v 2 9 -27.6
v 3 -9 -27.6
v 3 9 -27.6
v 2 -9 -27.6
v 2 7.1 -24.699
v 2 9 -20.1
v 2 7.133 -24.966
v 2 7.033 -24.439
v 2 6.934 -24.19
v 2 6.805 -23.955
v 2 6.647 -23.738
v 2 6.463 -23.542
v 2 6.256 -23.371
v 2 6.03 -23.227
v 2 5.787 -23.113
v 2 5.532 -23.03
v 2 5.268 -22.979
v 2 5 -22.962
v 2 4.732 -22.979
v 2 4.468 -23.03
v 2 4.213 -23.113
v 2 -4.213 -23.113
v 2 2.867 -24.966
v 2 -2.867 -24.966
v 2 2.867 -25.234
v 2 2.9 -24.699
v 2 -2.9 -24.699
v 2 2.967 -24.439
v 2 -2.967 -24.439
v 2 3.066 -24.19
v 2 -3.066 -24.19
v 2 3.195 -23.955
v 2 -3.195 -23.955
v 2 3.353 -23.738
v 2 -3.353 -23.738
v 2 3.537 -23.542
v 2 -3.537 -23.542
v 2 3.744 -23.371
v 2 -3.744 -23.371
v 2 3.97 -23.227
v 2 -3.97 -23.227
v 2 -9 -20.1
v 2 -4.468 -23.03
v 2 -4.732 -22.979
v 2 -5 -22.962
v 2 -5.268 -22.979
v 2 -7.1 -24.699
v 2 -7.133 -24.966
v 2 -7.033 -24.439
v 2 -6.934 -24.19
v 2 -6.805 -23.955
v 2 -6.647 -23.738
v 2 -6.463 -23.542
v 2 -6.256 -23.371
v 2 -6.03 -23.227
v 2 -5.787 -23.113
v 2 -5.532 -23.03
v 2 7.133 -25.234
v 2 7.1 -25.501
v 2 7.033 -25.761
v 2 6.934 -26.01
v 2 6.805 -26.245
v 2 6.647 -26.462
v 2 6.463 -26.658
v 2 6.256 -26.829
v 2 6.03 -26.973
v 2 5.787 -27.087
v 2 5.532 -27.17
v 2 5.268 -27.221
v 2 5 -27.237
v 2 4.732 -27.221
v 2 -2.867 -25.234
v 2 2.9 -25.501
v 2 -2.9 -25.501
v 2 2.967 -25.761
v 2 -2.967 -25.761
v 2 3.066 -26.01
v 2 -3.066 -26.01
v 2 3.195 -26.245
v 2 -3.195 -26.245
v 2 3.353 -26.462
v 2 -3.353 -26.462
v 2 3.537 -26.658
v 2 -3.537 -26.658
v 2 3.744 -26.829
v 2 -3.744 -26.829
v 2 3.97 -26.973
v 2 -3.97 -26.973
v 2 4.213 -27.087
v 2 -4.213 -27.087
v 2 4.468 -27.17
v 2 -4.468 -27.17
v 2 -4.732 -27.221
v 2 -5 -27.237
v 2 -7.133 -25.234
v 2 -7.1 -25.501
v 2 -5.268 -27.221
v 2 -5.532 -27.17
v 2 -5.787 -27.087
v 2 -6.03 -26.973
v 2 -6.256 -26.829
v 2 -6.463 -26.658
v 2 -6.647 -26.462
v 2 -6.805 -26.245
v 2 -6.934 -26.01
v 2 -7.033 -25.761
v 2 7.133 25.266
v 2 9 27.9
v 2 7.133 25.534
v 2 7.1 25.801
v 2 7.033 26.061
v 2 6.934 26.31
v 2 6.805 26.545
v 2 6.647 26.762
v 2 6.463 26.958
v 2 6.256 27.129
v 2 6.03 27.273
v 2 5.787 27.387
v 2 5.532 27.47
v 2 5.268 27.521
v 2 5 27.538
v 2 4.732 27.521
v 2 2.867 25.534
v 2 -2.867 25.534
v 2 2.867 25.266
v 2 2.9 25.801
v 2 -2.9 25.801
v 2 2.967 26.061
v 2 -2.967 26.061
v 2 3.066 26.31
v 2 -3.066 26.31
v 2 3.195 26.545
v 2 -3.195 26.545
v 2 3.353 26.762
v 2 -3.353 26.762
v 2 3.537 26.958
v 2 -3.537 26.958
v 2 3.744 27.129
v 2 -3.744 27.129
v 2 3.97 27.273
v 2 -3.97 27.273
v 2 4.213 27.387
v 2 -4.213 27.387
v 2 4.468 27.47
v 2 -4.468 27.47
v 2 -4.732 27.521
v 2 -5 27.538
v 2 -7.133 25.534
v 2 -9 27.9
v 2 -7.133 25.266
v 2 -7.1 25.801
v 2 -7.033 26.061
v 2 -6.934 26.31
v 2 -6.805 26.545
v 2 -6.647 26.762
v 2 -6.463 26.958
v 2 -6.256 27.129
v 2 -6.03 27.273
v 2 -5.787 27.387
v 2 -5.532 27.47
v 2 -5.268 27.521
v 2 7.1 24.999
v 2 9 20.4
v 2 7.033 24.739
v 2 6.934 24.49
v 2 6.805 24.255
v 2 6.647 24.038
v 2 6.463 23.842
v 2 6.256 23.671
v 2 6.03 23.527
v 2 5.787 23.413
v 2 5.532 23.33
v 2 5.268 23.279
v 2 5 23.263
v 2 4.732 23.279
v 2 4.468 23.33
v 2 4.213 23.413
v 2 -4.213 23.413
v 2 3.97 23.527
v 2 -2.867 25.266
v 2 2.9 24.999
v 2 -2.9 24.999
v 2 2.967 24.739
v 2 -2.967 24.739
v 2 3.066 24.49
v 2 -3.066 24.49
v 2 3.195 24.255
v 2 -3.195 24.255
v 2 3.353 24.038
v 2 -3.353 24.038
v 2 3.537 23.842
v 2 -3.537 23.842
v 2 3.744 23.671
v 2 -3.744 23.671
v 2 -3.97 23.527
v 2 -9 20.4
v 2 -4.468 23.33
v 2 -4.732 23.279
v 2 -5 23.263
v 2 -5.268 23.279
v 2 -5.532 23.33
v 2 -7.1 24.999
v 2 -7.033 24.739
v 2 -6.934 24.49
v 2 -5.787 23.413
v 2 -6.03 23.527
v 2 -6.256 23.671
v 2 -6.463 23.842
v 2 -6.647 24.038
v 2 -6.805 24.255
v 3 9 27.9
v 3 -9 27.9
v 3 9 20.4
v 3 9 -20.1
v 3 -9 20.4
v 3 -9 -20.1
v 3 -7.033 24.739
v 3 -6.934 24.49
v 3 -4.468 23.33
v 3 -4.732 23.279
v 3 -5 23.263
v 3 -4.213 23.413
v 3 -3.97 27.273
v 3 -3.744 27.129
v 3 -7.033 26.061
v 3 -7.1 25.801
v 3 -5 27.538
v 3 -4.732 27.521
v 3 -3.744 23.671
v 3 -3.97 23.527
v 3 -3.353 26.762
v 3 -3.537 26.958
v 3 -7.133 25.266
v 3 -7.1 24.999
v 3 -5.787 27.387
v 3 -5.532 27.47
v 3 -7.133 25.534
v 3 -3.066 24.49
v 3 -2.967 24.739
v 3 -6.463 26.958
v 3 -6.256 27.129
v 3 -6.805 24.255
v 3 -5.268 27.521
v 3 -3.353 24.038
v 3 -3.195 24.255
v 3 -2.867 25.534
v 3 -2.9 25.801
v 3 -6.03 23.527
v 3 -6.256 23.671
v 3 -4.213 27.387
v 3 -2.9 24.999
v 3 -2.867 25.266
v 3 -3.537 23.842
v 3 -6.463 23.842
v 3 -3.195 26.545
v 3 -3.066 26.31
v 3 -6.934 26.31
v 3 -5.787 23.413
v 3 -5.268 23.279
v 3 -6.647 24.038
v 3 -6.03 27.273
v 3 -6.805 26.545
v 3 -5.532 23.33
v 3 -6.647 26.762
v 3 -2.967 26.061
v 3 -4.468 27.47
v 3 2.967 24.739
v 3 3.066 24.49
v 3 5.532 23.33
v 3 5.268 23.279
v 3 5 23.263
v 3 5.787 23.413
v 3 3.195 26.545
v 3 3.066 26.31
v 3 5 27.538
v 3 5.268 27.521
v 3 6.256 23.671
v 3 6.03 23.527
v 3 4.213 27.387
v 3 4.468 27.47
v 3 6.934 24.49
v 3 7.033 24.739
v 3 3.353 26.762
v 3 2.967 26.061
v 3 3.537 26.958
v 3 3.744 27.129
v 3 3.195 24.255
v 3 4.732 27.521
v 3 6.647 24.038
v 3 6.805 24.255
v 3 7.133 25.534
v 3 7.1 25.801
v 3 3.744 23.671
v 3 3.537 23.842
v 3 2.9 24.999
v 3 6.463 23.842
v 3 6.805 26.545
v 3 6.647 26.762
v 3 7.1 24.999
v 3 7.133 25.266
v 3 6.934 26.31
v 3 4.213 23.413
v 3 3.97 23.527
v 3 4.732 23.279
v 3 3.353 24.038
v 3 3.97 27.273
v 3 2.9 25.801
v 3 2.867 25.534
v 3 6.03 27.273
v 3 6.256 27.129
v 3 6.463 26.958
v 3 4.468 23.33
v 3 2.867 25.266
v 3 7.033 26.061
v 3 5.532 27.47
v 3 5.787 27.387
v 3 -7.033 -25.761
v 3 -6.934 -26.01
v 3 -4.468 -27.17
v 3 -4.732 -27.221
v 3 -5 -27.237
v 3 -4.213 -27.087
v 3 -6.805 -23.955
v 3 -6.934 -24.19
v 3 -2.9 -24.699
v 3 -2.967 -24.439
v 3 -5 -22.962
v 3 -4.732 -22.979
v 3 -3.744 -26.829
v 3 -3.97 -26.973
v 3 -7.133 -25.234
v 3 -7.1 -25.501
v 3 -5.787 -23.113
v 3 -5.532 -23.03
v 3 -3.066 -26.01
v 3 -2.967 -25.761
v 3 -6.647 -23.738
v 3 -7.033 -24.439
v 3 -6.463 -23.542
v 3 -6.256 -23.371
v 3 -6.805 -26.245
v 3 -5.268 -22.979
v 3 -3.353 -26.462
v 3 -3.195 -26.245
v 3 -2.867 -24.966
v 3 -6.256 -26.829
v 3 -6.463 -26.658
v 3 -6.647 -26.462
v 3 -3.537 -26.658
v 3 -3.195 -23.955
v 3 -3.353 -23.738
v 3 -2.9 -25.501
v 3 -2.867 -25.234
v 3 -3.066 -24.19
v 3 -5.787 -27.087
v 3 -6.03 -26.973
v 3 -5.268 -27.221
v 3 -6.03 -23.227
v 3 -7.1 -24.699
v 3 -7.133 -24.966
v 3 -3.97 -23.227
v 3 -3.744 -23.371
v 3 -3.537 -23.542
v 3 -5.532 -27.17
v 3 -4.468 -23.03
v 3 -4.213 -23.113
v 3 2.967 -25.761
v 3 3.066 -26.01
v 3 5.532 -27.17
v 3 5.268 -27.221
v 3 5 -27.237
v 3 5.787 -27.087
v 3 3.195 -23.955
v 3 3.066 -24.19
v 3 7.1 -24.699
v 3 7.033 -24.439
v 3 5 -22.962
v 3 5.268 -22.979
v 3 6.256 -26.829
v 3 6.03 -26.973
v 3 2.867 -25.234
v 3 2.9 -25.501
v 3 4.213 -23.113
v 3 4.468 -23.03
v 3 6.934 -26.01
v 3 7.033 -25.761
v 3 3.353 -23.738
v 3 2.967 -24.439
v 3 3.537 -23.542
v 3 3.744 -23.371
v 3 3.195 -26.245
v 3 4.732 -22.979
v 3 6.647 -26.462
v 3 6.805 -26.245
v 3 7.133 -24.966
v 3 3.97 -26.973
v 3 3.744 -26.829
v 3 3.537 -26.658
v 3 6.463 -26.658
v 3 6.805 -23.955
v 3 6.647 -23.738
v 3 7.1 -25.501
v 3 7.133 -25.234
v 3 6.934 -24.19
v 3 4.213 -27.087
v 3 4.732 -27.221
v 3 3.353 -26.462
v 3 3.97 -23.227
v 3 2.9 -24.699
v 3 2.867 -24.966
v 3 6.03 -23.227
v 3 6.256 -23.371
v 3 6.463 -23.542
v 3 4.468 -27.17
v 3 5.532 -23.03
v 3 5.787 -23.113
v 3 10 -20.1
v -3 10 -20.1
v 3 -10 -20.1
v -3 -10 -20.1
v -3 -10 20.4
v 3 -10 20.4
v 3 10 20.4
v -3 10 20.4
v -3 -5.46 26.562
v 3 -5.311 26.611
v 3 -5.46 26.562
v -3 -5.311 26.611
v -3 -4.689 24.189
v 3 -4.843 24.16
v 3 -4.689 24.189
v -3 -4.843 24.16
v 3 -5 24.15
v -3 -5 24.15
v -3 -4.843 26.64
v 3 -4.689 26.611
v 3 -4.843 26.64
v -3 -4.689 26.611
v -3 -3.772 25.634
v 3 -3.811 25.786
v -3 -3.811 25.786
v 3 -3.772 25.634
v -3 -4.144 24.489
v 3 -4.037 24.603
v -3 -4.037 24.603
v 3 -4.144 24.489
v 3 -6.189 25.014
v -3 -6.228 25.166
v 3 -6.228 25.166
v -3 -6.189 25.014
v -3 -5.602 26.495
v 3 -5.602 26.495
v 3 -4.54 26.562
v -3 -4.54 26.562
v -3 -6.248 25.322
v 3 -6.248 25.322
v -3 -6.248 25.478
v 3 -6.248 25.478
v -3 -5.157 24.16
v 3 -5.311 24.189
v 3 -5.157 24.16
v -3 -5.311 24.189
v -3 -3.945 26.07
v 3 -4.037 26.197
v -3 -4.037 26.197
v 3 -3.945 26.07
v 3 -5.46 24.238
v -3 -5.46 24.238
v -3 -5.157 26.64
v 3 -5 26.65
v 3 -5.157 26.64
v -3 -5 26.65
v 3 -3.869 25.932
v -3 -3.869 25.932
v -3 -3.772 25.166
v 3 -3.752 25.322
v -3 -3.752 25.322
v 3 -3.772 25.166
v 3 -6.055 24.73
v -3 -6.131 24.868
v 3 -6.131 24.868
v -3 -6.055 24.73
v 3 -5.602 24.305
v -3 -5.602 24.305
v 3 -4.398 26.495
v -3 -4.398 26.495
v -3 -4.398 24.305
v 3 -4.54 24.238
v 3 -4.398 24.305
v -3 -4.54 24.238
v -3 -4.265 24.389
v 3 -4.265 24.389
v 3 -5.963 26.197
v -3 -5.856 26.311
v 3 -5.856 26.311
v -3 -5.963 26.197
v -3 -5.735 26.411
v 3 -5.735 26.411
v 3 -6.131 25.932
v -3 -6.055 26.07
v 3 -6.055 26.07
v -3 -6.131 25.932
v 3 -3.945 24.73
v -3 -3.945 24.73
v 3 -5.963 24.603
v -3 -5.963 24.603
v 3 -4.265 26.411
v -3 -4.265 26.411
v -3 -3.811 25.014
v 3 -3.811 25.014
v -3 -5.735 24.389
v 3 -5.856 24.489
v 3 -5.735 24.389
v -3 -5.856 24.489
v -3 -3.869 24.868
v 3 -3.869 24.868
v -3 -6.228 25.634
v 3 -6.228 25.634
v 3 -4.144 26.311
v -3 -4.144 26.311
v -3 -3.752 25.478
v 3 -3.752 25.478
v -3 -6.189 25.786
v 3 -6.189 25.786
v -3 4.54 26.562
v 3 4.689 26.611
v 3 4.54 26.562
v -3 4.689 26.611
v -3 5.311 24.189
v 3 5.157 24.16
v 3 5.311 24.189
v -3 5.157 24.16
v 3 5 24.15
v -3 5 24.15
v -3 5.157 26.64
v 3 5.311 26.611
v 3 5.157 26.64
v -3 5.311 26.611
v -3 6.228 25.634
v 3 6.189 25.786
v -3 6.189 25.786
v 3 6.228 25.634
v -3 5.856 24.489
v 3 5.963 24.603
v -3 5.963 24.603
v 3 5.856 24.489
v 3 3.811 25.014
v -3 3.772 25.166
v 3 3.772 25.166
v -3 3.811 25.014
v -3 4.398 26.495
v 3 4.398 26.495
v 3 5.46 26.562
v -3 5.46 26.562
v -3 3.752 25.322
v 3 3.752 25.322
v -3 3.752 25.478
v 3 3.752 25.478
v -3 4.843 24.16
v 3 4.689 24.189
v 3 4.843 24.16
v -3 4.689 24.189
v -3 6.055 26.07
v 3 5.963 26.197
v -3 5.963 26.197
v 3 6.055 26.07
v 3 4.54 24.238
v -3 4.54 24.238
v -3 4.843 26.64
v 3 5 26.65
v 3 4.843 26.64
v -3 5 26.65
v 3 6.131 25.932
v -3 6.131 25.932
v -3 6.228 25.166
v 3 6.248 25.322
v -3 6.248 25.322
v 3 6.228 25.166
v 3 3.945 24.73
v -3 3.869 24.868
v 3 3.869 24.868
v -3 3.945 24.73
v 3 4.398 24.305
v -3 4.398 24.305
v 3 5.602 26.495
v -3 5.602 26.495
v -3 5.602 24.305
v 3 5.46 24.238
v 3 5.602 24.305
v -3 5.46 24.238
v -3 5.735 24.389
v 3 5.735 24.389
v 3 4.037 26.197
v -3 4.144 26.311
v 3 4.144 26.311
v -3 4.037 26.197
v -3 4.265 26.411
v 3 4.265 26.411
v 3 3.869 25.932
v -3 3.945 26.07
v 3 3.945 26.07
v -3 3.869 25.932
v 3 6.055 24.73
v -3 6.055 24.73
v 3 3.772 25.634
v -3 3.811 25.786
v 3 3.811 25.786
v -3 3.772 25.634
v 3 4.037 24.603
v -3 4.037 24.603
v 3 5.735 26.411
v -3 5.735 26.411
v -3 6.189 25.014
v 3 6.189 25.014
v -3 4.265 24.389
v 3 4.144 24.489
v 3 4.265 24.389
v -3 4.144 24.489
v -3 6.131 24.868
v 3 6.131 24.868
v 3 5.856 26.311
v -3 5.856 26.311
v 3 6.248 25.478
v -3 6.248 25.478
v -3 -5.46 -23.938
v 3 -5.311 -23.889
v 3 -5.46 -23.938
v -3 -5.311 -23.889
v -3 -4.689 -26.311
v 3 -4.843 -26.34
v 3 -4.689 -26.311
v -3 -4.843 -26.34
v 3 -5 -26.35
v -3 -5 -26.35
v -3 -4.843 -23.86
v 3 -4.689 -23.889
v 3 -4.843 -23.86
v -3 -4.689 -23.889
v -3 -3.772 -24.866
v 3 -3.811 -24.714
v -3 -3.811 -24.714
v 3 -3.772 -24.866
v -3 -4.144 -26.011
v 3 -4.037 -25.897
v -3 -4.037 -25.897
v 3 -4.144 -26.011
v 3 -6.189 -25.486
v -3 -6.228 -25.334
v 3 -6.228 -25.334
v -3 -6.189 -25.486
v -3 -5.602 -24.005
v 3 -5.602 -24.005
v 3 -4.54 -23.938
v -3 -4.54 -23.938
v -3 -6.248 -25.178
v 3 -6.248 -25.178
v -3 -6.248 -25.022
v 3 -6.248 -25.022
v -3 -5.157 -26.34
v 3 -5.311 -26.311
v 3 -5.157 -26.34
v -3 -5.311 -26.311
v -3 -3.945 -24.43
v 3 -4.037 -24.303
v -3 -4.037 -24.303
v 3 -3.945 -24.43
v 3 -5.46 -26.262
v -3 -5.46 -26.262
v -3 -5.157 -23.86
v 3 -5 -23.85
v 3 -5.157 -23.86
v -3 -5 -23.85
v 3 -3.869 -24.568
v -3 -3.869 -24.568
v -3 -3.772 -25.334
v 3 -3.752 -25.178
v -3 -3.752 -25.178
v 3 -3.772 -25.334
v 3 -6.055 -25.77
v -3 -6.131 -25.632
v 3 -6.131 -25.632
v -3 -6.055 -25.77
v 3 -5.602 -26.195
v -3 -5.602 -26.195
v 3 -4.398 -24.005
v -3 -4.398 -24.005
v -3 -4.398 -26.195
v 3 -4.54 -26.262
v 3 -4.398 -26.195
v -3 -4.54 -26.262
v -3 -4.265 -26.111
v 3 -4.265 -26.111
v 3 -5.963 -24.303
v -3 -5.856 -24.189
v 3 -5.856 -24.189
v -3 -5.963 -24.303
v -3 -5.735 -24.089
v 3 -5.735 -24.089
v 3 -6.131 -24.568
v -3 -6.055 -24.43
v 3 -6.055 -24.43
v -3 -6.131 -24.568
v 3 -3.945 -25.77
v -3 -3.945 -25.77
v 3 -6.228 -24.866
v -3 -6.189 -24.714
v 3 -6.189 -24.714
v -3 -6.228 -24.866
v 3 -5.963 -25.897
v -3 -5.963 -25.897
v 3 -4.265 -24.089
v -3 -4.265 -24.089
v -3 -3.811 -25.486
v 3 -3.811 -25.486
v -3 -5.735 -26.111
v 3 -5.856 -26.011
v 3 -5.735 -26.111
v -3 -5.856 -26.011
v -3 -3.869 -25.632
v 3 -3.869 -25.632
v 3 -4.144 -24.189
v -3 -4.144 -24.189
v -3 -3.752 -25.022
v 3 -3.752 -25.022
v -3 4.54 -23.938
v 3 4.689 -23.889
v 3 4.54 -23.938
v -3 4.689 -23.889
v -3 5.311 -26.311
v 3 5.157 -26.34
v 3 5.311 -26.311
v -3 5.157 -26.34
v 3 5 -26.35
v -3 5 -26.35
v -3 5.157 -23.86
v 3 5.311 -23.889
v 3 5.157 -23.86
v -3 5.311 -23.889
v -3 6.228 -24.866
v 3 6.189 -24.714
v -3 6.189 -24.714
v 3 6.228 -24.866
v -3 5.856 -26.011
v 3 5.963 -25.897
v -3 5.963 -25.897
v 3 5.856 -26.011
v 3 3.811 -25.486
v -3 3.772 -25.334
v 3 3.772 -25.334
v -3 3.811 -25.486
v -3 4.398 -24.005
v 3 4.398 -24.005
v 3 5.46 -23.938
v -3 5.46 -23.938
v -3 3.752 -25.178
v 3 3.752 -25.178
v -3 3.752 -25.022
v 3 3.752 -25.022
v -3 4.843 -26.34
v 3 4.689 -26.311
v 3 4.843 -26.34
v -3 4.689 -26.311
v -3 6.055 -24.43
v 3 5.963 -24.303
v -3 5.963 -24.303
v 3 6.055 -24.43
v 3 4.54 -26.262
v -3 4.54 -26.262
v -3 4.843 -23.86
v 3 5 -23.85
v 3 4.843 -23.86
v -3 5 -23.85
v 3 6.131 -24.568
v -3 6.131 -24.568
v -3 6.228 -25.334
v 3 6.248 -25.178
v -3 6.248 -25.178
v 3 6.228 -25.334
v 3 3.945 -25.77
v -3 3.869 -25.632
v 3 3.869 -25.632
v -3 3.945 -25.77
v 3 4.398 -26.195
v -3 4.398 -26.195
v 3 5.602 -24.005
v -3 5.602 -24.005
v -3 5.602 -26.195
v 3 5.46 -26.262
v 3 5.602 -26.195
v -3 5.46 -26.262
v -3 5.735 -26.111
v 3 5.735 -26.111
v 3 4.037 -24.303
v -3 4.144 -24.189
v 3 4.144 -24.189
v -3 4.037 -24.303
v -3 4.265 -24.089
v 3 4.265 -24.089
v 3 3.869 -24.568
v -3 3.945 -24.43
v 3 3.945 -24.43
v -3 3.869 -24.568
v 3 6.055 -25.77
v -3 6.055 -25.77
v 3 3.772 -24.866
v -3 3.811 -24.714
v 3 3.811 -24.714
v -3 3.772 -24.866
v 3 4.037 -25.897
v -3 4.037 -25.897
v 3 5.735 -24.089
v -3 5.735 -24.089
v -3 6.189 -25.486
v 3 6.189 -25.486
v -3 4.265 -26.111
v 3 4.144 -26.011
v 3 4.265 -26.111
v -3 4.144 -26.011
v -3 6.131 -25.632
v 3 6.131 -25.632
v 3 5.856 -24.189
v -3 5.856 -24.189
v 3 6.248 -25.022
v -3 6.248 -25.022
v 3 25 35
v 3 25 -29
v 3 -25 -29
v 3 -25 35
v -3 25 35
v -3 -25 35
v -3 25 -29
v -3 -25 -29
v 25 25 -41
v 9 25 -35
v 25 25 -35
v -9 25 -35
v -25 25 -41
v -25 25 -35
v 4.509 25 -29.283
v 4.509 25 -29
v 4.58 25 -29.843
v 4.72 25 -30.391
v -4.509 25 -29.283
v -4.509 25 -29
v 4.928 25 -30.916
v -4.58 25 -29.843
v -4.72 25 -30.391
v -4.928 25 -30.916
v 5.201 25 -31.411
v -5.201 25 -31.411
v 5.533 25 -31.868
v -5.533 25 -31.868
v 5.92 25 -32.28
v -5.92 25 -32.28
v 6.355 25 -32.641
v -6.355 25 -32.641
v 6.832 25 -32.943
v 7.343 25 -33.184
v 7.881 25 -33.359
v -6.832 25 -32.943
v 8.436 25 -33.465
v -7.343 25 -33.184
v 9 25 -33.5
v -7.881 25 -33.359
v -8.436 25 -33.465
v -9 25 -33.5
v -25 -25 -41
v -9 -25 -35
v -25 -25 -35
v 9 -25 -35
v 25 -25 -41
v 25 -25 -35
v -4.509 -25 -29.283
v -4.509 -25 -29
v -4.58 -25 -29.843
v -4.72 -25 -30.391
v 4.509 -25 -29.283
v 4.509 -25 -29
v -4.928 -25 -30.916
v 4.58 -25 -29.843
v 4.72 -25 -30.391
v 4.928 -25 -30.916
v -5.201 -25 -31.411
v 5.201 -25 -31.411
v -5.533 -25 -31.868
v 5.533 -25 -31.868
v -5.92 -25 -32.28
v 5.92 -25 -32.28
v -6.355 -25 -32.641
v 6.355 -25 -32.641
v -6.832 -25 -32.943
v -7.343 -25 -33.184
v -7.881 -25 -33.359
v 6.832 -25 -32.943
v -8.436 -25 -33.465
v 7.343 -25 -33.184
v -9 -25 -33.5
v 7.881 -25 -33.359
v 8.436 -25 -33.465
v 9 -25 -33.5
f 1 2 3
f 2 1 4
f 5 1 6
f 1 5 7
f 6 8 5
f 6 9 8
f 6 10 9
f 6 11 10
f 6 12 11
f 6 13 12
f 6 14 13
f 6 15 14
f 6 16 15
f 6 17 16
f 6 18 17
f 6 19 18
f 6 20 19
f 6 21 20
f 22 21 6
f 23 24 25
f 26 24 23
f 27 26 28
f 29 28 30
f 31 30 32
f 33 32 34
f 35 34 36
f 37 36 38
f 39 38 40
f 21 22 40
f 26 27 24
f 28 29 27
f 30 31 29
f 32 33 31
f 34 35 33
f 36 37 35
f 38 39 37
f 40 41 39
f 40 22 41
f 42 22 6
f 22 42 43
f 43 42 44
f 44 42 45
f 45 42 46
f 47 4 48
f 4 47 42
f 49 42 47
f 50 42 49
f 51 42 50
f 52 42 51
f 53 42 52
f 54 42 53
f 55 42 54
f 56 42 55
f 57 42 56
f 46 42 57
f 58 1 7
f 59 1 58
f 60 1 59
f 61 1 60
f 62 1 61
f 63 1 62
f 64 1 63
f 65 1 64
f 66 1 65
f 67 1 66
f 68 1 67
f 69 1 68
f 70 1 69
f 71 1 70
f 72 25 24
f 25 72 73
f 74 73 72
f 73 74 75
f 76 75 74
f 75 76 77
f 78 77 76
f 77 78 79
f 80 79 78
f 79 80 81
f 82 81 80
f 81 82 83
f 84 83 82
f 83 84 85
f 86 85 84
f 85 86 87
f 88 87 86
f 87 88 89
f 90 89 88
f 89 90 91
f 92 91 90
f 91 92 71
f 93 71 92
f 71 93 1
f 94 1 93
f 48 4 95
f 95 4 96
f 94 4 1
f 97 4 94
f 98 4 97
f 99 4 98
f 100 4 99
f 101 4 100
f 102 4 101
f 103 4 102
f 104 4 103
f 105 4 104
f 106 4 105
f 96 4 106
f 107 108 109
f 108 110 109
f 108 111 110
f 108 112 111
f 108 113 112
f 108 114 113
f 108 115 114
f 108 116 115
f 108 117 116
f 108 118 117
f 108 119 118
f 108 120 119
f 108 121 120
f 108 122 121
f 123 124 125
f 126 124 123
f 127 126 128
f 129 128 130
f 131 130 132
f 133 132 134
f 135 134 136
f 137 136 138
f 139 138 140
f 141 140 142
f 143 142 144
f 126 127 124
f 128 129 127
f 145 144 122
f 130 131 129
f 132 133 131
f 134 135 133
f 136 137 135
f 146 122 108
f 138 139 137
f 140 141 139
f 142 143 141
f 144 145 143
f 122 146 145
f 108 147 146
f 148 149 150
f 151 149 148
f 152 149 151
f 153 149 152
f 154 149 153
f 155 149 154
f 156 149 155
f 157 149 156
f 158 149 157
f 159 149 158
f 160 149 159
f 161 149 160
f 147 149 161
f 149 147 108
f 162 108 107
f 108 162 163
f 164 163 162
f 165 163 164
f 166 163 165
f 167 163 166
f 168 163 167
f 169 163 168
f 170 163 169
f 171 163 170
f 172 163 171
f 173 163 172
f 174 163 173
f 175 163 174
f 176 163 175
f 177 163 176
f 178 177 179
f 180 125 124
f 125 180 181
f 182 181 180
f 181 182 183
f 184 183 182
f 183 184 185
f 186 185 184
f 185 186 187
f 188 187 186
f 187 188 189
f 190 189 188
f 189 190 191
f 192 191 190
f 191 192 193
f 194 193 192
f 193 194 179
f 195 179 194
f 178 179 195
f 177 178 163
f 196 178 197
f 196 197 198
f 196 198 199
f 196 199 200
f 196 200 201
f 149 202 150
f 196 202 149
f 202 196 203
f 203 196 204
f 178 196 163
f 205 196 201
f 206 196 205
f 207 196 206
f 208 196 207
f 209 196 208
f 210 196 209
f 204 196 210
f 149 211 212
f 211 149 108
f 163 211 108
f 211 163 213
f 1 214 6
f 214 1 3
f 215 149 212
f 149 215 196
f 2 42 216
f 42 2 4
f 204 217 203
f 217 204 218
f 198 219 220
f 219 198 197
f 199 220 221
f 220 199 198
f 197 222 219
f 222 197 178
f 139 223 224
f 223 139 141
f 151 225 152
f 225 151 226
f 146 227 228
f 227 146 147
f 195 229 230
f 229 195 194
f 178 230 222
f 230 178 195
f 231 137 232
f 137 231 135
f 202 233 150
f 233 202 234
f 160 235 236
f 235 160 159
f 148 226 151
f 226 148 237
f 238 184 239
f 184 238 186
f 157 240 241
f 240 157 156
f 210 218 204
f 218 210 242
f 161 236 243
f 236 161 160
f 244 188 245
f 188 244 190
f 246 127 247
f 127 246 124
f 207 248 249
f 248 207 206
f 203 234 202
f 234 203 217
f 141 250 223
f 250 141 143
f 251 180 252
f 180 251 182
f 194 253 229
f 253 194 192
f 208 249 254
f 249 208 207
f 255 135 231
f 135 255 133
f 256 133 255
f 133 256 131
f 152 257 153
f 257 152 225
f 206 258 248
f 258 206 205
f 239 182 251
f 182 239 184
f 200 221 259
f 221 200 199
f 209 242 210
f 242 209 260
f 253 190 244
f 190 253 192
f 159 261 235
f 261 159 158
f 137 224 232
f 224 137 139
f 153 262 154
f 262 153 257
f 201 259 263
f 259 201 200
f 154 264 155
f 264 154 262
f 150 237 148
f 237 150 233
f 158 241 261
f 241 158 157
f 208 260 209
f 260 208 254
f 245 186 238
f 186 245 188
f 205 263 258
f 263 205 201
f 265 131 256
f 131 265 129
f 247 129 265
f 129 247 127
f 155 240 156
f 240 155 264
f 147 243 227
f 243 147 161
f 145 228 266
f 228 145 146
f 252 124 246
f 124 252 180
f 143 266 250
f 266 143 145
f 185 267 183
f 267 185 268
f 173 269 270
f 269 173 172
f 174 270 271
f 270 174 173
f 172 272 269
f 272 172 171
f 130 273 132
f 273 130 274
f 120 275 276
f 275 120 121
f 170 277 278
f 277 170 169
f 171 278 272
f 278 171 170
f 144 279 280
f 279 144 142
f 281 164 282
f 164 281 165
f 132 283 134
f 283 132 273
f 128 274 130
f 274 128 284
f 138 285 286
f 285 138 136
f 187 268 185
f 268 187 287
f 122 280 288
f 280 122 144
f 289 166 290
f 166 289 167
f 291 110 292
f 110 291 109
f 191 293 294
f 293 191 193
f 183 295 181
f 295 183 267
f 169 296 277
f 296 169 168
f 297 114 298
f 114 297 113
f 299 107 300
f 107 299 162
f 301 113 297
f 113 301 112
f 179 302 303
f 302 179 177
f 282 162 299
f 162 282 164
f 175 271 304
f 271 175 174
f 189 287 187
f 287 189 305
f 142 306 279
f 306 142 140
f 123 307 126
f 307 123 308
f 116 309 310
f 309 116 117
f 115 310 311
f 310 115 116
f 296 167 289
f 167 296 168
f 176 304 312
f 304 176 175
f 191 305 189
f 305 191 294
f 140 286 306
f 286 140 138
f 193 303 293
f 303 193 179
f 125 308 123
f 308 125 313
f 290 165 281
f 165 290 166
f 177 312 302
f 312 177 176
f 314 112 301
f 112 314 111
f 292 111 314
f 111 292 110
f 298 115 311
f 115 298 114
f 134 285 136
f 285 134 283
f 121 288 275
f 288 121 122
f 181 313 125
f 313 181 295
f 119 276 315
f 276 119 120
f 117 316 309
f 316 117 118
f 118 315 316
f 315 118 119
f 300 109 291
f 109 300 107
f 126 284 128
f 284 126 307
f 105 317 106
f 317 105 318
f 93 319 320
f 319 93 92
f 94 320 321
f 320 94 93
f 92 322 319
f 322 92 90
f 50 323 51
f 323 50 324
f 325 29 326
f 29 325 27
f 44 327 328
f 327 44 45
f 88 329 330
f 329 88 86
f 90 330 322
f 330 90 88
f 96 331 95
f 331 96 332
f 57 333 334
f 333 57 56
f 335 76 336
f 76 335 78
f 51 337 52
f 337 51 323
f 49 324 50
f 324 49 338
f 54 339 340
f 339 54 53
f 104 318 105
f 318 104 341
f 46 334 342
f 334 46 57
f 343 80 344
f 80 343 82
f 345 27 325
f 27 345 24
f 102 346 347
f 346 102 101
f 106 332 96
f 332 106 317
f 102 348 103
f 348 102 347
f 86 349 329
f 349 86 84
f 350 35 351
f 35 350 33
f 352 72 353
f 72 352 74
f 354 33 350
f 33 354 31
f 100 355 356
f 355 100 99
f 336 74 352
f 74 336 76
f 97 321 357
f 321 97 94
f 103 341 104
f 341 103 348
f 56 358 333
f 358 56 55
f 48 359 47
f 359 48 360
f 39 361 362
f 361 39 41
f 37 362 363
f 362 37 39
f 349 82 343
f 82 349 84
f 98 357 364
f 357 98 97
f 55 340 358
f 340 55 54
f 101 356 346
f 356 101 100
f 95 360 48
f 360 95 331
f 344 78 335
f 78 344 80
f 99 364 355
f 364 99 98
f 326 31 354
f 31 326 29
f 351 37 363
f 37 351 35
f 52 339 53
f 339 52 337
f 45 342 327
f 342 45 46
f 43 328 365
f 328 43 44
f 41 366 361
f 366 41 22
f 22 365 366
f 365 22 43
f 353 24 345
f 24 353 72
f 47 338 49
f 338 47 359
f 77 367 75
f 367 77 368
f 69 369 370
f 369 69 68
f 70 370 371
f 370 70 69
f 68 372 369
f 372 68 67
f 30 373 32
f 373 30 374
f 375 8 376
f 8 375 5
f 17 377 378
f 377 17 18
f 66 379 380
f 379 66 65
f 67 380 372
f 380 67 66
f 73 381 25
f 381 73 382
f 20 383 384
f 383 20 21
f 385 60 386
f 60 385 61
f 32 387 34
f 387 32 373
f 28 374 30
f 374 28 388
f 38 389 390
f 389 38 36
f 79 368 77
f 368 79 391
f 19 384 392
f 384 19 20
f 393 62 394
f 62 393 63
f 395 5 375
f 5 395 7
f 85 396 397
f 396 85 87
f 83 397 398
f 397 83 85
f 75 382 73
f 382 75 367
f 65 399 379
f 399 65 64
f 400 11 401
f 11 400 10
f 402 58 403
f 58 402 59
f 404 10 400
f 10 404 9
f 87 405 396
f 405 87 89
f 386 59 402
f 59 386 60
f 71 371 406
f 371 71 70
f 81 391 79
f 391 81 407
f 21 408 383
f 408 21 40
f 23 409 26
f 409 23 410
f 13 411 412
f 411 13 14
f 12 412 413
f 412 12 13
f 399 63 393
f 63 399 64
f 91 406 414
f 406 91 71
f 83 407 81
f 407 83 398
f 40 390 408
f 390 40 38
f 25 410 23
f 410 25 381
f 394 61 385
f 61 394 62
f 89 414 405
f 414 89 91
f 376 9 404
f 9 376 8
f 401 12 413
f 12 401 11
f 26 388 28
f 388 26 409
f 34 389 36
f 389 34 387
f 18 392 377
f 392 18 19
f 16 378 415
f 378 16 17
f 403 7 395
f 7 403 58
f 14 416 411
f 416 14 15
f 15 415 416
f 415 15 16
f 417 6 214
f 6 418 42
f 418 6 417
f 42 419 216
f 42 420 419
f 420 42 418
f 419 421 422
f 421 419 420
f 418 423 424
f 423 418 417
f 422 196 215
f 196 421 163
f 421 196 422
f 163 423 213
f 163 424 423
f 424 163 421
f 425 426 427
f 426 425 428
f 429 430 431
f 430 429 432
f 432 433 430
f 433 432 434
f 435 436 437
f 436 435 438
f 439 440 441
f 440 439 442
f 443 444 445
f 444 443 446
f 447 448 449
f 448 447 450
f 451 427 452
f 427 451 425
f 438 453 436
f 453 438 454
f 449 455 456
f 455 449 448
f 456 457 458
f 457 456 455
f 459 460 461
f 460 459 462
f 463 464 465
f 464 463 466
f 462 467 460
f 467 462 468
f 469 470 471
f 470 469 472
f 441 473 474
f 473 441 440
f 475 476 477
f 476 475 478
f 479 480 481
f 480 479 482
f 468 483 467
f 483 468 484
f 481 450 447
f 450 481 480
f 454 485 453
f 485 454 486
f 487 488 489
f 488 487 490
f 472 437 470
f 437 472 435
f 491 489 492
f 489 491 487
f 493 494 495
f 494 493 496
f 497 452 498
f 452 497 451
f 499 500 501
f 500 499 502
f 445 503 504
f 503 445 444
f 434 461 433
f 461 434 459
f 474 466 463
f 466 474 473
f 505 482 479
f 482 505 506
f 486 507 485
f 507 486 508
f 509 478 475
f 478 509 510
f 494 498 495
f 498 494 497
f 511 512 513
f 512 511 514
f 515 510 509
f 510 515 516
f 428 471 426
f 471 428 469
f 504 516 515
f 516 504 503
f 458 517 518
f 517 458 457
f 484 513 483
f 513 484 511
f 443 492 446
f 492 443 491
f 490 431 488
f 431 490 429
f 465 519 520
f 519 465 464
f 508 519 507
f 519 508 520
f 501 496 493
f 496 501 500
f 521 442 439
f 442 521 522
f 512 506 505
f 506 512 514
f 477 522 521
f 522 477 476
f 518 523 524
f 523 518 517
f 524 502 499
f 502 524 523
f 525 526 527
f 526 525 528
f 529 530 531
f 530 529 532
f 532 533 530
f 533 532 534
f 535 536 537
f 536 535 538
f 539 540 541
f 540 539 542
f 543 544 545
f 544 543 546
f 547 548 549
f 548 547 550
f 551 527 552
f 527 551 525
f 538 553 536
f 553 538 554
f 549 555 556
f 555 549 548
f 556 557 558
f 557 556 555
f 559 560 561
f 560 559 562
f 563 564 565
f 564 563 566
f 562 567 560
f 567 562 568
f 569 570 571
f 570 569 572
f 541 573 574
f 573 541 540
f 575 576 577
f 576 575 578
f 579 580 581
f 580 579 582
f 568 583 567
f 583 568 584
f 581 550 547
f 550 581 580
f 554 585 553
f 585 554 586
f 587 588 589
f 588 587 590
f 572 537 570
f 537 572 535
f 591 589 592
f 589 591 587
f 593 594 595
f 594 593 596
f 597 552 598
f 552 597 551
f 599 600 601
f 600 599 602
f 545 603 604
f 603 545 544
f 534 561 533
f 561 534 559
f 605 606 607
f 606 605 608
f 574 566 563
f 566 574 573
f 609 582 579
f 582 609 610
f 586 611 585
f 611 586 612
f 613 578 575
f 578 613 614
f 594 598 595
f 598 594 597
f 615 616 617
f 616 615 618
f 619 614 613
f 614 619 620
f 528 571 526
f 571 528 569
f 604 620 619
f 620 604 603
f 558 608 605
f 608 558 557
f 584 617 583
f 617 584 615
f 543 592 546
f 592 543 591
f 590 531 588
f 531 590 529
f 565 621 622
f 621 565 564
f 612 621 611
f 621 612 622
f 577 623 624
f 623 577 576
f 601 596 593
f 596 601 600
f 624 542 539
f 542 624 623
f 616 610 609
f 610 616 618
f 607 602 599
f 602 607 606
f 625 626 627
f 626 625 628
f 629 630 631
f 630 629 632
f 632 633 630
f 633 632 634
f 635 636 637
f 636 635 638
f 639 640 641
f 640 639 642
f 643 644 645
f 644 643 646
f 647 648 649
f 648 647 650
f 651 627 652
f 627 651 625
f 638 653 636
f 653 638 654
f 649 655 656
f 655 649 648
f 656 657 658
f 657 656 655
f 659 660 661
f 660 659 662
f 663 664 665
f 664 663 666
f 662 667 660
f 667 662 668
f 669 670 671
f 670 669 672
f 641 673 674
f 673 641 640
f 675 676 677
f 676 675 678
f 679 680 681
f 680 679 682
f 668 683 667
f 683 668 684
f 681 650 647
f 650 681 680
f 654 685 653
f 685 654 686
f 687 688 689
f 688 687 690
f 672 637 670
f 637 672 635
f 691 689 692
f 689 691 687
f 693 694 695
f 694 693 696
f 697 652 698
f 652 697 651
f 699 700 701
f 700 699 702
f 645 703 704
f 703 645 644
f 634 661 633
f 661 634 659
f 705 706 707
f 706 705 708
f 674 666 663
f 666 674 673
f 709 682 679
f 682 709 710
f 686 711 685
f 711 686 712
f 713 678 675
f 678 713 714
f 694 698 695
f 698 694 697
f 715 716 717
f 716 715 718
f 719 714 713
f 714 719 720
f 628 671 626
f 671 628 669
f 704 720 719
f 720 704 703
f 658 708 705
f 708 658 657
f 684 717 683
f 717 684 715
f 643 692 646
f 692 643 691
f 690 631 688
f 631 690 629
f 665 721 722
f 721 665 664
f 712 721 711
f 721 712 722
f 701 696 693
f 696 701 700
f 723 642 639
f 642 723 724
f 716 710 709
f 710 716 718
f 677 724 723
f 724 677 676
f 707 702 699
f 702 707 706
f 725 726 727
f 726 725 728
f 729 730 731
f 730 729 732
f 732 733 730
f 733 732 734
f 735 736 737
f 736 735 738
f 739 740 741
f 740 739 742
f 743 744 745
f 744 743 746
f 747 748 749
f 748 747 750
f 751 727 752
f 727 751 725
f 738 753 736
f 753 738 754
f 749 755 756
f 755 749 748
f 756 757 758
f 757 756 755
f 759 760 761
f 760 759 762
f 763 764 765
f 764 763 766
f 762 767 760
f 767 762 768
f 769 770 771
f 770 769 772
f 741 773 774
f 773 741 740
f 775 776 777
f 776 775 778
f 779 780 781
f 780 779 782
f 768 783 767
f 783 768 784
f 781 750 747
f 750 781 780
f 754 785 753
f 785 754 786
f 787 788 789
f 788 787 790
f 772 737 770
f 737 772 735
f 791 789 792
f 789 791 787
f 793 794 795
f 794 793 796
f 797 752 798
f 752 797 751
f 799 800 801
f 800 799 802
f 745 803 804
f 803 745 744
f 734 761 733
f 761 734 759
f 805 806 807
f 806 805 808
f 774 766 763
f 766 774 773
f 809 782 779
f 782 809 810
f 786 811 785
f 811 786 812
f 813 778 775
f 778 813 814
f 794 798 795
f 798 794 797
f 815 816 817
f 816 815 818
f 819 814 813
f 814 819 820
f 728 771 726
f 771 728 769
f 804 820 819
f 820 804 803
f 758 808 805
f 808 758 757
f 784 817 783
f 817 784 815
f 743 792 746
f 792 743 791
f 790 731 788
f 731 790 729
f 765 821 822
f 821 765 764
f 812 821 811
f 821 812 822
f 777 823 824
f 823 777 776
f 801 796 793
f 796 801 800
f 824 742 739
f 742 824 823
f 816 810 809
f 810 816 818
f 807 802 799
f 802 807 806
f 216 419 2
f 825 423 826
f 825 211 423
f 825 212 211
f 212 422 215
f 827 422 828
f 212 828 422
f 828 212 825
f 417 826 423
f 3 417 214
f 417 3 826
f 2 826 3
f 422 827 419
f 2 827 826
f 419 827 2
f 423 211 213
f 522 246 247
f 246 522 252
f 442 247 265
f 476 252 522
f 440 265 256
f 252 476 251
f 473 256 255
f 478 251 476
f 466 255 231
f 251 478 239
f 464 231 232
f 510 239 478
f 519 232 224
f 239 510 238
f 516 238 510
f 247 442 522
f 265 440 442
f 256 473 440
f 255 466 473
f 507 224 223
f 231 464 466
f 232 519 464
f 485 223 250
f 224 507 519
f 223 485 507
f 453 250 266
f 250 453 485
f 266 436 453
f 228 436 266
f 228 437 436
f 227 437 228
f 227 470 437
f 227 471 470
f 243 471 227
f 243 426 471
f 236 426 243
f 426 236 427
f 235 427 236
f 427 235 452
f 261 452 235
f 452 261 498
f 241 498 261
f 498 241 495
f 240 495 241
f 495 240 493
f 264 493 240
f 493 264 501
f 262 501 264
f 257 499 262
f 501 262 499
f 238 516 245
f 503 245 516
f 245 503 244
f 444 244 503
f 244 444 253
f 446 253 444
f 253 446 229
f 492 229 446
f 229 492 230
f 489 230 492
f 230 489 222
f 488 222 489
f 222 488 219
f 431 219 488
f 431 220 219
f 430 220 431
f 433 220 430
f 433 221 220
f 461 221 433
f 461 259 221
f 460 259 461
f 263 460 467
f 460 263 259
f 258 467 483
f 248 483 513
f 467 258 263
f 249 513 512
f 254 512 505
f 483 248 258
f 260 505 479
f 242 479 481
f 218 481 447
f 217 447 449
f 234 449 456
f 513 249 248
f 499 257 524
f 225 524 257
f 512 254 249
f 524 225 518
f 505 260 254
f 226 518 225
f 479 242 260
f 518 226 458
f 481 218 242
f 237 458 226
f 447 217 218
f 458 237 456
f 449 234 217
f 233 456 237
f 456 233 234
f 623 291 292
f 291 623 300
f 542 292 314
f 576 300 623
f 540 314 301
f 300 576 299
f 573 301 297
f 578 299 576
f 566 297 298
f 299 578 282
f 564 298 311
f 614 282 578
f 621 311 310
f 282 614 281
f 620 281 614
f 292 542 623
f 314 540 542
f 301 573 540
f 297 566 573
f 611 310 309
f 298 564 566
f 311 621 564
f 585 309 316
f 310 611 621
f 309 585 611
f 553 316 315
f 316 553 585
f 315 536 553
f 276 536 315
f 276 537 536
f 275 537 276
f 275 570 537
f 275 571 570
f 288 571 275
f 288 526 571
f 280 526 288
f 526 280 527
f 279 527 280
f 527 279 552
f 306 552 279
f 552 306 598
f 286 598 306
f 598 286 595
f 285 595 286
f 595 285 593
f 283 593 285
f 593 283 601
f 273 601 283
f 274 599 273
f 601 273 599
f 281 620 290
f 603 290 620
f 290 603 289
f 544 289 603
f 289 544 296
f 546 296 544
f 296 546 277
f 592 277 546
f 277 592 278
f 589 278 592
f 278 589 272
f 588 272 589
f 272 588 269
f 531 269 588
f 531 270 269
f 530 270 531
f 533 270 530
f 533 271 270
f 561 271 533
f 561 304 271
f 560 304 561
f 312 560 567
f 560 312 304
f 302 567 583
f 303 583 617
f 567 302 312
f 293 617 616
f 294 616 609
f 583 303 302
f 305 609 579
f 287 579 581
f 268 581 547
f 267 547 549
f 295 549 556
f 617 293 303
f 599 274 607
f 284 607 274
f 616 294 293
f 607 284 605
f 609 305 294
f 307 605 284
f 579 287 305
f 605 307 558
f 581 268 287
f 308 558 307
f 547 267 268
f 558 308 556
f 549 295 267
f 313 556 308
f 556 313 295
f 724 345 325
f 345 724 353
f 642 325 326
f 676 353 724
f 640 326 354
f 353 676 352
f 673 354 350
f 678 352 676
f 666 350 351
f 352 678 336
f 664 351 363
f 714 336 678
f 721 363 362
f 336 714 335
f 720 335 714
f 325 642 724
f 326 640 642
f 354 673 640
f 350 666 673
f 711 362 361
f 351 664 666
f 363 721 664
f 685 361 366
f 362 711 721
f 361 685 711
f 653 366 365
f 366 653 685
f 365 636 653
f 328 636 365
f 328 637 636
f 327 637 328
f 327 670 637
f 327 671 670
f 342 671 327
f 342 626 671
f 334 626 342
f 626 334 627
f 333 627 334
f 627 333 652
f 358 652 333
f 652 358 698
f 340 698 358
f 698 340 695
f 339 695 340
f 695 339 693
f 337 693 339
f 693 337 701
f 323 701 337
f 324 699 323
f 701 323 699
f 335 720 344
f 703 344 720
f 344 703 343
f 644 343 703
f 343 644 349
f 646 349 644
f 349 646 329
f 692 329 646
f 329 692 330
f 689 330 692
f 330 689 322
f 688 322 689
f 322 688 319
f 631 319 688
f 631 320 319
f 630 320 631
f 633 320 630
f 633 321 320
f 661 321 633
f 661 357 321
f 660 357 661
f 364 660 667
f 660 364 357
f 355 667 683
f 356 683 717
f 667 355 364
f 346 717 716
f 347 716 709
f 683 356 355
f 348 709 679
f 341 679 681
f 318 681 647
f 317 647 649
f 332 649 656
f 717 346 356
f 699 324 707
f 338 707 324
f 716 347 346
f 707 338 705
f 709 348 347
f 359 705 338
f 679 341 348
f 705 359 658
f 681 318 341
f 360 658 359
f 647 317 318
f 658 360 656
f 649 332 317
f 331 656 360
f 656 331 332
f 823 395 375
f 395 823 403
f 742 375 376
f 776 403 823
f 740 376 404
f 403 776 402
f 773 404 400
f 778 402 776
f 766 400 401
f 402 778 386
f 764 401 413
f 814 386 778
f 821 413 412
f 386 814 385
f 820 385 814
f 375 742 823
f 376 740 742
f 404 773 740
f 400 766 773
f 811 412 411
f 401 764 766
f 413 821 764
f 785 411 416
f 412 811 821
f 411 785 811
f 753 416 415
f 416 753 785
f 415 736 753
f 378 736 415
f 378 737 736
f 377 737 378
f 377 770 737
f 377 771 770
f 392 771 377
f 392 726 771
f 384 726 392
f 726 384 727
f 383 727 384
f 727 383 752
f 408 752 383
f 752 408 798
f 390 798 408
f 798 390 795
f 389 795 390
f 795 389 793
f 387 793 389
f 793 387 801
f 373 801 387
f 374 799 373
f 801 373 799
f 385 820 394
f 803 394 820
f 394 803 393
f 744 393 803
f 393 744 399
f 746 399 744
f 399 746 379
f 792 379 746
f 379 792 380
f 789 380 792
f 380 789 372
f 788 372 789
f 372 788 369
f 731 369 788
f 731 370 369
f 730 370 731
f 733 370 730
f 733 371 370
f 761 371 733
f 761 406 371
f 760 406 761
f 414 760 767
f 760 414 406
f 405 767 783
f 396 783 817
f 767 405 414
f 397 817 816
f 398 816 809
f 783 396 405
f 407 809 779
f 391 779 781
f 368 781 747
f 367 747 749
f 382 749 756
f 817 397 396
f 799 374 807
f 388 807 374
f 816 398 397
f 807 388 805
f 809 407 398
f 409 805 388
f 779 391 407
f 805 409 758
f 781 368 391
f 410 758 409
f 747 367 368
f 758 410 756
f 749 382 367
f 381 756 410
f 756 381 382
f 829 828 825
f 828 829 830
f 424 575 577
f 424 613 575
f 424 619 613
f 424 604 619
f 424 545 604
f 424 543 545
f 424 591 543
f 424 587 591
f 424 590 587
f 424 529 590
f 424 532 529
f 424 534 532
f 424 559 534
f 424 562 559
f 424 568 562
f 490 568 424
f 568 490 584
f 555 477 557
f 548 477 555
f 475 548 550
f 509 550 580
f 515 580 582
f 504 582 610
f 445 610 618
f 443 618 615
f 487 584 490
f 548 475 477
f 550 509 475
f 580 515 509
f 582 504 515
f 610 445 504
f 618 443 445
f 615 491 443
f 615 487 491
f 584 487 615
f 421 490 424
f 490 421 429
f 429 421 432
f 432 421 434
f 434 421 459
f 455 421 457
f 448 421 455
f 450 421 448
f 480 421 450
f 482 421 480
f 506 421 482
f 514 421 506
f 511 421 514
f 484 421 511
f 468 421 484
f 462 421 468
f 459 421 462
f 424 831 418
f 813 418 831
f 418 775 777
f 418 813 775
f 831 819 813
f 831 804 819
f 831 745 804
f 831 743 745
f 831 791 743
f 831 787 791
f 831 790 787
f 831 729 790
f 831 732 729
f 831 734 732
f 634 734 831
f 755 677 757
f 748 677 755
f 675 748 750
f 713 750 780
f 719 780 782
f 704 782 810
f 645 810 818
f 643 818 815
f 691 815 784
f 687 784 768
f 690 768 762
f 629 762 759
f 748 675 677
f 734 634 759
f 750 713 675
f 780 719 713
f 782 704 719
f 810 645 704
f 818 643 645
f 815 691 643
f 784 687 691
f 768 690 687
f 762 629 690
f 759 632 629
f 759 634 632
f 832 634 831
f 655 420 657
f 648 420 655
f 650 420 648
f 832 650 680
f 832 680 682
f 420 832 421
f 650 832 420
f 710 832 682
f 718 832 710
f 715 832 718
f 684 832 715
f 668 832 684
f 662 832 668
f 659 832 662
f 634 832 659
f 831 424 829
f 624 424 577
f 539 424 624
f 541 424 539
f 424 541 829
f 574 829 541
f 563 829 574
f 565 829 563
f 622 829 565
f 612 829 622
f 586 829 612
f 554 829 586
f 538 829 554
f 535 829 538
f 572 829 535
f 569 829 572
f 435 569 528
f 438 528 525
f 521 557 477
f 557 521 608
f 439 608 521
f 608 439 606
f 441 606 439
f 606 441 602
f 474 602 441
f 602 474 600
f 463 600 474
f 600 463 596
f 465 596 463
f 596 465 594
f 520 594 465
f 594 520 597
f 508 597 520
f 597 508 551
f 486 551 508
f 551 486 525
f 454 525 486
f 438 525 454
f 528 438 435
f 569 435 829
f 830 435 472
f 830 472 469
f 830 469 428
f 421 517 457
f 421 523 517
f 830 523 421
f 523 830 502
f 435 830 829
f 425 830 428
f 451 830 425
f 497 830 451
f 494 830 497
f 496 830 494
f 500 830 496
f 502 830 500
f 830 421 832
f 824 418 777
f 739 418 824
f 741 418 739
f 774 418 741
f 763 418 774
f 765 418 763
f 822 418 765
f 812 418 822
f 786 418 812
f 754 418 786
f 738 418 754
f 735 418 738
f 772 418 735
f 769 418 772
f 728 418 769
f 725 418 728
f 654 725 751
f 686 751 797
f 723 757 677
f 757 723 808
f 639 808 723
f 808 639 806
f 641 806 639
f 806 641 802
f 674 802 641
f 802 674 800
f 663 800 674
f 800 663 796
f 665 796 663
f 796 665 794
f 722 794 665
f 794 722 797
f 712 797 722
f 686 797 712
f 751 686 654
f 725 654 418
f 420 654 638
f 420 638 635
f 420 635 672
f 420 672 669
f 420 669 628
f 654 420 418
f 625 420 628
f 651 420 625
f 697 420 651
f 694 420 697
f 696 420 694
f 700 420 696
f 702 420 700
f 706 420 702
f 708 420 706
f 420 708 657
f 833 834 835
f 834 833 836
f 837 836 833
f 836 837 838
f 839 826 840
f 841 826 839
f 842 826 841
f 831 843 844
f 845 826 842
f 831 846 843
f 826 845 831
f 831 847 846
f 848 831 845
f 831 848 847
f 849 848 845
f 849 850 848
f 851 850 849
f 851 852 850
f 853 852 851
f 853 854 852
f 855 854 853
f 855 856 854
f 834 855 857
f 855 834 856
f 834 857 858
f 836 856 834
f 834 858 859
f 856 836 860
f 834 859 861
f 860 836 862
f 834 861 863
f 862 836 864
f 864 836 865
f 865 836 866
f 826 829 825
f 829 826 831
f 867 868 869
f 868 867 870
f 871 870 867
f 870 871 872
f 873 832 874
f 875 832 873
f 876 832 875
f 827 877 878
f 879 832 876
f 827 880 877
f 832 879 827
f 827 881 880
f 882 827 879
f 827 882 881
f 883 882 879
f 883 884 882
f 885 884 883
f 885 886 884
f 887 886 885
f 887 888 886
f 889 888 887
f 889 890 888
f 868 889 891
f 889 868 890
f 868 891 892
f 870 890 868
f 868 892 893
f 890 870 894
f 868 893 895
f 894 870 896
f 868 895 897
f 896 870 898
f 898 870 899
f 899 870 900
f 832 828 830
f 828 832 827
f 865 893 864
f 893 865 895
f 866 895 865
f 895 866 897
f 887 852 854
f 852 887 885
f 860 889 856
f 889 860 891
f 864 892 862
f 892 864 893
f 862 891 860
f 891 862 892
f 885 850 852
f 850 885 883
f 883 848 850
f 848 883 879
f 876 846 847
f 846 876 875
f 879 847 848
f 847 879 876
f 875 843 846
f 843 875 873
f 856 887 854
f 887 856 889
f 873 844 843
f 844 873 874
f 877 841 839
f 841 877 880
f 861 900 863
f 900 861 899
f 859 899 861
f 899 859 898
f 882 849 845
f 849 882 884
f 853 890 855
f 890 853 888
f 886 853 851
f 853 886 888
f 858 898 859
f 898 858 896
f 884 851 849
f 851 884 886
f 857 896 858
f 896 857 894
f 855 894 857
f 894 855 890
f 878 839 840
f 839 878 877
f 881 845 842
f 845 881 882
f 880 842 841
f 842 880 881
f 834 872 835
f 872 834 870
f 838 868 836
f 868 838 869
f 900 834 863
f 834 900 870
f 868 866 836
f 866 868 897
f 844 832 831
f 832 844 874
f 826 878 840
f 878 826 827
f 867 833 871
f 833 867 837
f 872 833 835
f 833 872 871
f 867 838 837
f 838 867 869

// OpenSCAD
/**
 * @author OlivierLD
 * 
 * A test, a stand for a servoParallax900_00005()
 * With an optional plate for the stand. 
 * -> See 'option' at the bottom of the script.
 */
use <../mechanical.parts.scad>

standThickness = 6;

servoXOffset = 26.6 - standThickness; // From the servo's specs.
servoZOffset = 10;

deeper = -1;

verticalBoardWidth = 50;
verticalBoardHeight = 70;
horizontalStandLength = 50;

// Vertical board, with servo socket
module servoSocket() {
	difference() {
		cube(size=[standThickness, verticalBoardWidth, verticalBoardHeight], center=true);
		translate([- (standThickness / 2) - (servoXOffset) + deeper, 0, servoZOffset]) {
			rotate([0, 90, 0]) {
				// Use the # in front of the lines below to see the parts.
				servoParallax900_00005();
				servoParallax900_00005(drillPattern=true, drillLength=20, drillDiam=2.5);
			}
		}
	}
}

// Horizontal stand
module socketStand() {
	rotate([0, 90, 0]) {
		translate([(verticalBoardHeight / 2), 
							 -(verticalBoardWidth / 2), 
							 -(horizontalStandLength / 2)]) {
			union() {							 
				cube(size=[standThickness, verticalBoardWidth, horizontalStandLength]);
				difference() {
					translate([-standThickness, 0, (verticalBoardWidth / 2) - (3 * standThickness / 2)]) {
						cube(size=[standThickness, verticalBoardWidth, 3 * standThickness]);
					}
					rotate([90, 0, 0]) {
						cylinderDiam = standThickness * 1.5;
						translate([-standThickness, // Height
										   (horizontalStandLength / 2) - (3 * standThickness / 2), 
						           -verticalBoardWidth]) {
							cylinder(h=verticalBoardWidth, d=cylinderDiam, $fn=50);
						}
						translate([-standThickness, // Height
										   (horizontalStandLength / 2) + (3 * standThickness / 2), 
						           -verticalBoardWidth]) {
							cylinder(h=verticalBoardWidth, d=cylinderDiam, $fn=50);
						}
					}
				}
			}
		}
	}
}

SERVO_SOCKET_ONLY = 1;
SOCKET_STAND_ONLY = 2;
BOTH = 3;

// Change at will with the values above
option = BOTH; // SOCKET_STAND_ONLY;

if (option == BOTH) {
  servoSocket();
  socketStand();
} else if (option == SERVO_SOCKET_ONLY) {
  servoSocket();
} else if (option == SOCKET_STAND_ONLY) {
	difference() {
		socketStand();
		servoSocket();
	}
}
